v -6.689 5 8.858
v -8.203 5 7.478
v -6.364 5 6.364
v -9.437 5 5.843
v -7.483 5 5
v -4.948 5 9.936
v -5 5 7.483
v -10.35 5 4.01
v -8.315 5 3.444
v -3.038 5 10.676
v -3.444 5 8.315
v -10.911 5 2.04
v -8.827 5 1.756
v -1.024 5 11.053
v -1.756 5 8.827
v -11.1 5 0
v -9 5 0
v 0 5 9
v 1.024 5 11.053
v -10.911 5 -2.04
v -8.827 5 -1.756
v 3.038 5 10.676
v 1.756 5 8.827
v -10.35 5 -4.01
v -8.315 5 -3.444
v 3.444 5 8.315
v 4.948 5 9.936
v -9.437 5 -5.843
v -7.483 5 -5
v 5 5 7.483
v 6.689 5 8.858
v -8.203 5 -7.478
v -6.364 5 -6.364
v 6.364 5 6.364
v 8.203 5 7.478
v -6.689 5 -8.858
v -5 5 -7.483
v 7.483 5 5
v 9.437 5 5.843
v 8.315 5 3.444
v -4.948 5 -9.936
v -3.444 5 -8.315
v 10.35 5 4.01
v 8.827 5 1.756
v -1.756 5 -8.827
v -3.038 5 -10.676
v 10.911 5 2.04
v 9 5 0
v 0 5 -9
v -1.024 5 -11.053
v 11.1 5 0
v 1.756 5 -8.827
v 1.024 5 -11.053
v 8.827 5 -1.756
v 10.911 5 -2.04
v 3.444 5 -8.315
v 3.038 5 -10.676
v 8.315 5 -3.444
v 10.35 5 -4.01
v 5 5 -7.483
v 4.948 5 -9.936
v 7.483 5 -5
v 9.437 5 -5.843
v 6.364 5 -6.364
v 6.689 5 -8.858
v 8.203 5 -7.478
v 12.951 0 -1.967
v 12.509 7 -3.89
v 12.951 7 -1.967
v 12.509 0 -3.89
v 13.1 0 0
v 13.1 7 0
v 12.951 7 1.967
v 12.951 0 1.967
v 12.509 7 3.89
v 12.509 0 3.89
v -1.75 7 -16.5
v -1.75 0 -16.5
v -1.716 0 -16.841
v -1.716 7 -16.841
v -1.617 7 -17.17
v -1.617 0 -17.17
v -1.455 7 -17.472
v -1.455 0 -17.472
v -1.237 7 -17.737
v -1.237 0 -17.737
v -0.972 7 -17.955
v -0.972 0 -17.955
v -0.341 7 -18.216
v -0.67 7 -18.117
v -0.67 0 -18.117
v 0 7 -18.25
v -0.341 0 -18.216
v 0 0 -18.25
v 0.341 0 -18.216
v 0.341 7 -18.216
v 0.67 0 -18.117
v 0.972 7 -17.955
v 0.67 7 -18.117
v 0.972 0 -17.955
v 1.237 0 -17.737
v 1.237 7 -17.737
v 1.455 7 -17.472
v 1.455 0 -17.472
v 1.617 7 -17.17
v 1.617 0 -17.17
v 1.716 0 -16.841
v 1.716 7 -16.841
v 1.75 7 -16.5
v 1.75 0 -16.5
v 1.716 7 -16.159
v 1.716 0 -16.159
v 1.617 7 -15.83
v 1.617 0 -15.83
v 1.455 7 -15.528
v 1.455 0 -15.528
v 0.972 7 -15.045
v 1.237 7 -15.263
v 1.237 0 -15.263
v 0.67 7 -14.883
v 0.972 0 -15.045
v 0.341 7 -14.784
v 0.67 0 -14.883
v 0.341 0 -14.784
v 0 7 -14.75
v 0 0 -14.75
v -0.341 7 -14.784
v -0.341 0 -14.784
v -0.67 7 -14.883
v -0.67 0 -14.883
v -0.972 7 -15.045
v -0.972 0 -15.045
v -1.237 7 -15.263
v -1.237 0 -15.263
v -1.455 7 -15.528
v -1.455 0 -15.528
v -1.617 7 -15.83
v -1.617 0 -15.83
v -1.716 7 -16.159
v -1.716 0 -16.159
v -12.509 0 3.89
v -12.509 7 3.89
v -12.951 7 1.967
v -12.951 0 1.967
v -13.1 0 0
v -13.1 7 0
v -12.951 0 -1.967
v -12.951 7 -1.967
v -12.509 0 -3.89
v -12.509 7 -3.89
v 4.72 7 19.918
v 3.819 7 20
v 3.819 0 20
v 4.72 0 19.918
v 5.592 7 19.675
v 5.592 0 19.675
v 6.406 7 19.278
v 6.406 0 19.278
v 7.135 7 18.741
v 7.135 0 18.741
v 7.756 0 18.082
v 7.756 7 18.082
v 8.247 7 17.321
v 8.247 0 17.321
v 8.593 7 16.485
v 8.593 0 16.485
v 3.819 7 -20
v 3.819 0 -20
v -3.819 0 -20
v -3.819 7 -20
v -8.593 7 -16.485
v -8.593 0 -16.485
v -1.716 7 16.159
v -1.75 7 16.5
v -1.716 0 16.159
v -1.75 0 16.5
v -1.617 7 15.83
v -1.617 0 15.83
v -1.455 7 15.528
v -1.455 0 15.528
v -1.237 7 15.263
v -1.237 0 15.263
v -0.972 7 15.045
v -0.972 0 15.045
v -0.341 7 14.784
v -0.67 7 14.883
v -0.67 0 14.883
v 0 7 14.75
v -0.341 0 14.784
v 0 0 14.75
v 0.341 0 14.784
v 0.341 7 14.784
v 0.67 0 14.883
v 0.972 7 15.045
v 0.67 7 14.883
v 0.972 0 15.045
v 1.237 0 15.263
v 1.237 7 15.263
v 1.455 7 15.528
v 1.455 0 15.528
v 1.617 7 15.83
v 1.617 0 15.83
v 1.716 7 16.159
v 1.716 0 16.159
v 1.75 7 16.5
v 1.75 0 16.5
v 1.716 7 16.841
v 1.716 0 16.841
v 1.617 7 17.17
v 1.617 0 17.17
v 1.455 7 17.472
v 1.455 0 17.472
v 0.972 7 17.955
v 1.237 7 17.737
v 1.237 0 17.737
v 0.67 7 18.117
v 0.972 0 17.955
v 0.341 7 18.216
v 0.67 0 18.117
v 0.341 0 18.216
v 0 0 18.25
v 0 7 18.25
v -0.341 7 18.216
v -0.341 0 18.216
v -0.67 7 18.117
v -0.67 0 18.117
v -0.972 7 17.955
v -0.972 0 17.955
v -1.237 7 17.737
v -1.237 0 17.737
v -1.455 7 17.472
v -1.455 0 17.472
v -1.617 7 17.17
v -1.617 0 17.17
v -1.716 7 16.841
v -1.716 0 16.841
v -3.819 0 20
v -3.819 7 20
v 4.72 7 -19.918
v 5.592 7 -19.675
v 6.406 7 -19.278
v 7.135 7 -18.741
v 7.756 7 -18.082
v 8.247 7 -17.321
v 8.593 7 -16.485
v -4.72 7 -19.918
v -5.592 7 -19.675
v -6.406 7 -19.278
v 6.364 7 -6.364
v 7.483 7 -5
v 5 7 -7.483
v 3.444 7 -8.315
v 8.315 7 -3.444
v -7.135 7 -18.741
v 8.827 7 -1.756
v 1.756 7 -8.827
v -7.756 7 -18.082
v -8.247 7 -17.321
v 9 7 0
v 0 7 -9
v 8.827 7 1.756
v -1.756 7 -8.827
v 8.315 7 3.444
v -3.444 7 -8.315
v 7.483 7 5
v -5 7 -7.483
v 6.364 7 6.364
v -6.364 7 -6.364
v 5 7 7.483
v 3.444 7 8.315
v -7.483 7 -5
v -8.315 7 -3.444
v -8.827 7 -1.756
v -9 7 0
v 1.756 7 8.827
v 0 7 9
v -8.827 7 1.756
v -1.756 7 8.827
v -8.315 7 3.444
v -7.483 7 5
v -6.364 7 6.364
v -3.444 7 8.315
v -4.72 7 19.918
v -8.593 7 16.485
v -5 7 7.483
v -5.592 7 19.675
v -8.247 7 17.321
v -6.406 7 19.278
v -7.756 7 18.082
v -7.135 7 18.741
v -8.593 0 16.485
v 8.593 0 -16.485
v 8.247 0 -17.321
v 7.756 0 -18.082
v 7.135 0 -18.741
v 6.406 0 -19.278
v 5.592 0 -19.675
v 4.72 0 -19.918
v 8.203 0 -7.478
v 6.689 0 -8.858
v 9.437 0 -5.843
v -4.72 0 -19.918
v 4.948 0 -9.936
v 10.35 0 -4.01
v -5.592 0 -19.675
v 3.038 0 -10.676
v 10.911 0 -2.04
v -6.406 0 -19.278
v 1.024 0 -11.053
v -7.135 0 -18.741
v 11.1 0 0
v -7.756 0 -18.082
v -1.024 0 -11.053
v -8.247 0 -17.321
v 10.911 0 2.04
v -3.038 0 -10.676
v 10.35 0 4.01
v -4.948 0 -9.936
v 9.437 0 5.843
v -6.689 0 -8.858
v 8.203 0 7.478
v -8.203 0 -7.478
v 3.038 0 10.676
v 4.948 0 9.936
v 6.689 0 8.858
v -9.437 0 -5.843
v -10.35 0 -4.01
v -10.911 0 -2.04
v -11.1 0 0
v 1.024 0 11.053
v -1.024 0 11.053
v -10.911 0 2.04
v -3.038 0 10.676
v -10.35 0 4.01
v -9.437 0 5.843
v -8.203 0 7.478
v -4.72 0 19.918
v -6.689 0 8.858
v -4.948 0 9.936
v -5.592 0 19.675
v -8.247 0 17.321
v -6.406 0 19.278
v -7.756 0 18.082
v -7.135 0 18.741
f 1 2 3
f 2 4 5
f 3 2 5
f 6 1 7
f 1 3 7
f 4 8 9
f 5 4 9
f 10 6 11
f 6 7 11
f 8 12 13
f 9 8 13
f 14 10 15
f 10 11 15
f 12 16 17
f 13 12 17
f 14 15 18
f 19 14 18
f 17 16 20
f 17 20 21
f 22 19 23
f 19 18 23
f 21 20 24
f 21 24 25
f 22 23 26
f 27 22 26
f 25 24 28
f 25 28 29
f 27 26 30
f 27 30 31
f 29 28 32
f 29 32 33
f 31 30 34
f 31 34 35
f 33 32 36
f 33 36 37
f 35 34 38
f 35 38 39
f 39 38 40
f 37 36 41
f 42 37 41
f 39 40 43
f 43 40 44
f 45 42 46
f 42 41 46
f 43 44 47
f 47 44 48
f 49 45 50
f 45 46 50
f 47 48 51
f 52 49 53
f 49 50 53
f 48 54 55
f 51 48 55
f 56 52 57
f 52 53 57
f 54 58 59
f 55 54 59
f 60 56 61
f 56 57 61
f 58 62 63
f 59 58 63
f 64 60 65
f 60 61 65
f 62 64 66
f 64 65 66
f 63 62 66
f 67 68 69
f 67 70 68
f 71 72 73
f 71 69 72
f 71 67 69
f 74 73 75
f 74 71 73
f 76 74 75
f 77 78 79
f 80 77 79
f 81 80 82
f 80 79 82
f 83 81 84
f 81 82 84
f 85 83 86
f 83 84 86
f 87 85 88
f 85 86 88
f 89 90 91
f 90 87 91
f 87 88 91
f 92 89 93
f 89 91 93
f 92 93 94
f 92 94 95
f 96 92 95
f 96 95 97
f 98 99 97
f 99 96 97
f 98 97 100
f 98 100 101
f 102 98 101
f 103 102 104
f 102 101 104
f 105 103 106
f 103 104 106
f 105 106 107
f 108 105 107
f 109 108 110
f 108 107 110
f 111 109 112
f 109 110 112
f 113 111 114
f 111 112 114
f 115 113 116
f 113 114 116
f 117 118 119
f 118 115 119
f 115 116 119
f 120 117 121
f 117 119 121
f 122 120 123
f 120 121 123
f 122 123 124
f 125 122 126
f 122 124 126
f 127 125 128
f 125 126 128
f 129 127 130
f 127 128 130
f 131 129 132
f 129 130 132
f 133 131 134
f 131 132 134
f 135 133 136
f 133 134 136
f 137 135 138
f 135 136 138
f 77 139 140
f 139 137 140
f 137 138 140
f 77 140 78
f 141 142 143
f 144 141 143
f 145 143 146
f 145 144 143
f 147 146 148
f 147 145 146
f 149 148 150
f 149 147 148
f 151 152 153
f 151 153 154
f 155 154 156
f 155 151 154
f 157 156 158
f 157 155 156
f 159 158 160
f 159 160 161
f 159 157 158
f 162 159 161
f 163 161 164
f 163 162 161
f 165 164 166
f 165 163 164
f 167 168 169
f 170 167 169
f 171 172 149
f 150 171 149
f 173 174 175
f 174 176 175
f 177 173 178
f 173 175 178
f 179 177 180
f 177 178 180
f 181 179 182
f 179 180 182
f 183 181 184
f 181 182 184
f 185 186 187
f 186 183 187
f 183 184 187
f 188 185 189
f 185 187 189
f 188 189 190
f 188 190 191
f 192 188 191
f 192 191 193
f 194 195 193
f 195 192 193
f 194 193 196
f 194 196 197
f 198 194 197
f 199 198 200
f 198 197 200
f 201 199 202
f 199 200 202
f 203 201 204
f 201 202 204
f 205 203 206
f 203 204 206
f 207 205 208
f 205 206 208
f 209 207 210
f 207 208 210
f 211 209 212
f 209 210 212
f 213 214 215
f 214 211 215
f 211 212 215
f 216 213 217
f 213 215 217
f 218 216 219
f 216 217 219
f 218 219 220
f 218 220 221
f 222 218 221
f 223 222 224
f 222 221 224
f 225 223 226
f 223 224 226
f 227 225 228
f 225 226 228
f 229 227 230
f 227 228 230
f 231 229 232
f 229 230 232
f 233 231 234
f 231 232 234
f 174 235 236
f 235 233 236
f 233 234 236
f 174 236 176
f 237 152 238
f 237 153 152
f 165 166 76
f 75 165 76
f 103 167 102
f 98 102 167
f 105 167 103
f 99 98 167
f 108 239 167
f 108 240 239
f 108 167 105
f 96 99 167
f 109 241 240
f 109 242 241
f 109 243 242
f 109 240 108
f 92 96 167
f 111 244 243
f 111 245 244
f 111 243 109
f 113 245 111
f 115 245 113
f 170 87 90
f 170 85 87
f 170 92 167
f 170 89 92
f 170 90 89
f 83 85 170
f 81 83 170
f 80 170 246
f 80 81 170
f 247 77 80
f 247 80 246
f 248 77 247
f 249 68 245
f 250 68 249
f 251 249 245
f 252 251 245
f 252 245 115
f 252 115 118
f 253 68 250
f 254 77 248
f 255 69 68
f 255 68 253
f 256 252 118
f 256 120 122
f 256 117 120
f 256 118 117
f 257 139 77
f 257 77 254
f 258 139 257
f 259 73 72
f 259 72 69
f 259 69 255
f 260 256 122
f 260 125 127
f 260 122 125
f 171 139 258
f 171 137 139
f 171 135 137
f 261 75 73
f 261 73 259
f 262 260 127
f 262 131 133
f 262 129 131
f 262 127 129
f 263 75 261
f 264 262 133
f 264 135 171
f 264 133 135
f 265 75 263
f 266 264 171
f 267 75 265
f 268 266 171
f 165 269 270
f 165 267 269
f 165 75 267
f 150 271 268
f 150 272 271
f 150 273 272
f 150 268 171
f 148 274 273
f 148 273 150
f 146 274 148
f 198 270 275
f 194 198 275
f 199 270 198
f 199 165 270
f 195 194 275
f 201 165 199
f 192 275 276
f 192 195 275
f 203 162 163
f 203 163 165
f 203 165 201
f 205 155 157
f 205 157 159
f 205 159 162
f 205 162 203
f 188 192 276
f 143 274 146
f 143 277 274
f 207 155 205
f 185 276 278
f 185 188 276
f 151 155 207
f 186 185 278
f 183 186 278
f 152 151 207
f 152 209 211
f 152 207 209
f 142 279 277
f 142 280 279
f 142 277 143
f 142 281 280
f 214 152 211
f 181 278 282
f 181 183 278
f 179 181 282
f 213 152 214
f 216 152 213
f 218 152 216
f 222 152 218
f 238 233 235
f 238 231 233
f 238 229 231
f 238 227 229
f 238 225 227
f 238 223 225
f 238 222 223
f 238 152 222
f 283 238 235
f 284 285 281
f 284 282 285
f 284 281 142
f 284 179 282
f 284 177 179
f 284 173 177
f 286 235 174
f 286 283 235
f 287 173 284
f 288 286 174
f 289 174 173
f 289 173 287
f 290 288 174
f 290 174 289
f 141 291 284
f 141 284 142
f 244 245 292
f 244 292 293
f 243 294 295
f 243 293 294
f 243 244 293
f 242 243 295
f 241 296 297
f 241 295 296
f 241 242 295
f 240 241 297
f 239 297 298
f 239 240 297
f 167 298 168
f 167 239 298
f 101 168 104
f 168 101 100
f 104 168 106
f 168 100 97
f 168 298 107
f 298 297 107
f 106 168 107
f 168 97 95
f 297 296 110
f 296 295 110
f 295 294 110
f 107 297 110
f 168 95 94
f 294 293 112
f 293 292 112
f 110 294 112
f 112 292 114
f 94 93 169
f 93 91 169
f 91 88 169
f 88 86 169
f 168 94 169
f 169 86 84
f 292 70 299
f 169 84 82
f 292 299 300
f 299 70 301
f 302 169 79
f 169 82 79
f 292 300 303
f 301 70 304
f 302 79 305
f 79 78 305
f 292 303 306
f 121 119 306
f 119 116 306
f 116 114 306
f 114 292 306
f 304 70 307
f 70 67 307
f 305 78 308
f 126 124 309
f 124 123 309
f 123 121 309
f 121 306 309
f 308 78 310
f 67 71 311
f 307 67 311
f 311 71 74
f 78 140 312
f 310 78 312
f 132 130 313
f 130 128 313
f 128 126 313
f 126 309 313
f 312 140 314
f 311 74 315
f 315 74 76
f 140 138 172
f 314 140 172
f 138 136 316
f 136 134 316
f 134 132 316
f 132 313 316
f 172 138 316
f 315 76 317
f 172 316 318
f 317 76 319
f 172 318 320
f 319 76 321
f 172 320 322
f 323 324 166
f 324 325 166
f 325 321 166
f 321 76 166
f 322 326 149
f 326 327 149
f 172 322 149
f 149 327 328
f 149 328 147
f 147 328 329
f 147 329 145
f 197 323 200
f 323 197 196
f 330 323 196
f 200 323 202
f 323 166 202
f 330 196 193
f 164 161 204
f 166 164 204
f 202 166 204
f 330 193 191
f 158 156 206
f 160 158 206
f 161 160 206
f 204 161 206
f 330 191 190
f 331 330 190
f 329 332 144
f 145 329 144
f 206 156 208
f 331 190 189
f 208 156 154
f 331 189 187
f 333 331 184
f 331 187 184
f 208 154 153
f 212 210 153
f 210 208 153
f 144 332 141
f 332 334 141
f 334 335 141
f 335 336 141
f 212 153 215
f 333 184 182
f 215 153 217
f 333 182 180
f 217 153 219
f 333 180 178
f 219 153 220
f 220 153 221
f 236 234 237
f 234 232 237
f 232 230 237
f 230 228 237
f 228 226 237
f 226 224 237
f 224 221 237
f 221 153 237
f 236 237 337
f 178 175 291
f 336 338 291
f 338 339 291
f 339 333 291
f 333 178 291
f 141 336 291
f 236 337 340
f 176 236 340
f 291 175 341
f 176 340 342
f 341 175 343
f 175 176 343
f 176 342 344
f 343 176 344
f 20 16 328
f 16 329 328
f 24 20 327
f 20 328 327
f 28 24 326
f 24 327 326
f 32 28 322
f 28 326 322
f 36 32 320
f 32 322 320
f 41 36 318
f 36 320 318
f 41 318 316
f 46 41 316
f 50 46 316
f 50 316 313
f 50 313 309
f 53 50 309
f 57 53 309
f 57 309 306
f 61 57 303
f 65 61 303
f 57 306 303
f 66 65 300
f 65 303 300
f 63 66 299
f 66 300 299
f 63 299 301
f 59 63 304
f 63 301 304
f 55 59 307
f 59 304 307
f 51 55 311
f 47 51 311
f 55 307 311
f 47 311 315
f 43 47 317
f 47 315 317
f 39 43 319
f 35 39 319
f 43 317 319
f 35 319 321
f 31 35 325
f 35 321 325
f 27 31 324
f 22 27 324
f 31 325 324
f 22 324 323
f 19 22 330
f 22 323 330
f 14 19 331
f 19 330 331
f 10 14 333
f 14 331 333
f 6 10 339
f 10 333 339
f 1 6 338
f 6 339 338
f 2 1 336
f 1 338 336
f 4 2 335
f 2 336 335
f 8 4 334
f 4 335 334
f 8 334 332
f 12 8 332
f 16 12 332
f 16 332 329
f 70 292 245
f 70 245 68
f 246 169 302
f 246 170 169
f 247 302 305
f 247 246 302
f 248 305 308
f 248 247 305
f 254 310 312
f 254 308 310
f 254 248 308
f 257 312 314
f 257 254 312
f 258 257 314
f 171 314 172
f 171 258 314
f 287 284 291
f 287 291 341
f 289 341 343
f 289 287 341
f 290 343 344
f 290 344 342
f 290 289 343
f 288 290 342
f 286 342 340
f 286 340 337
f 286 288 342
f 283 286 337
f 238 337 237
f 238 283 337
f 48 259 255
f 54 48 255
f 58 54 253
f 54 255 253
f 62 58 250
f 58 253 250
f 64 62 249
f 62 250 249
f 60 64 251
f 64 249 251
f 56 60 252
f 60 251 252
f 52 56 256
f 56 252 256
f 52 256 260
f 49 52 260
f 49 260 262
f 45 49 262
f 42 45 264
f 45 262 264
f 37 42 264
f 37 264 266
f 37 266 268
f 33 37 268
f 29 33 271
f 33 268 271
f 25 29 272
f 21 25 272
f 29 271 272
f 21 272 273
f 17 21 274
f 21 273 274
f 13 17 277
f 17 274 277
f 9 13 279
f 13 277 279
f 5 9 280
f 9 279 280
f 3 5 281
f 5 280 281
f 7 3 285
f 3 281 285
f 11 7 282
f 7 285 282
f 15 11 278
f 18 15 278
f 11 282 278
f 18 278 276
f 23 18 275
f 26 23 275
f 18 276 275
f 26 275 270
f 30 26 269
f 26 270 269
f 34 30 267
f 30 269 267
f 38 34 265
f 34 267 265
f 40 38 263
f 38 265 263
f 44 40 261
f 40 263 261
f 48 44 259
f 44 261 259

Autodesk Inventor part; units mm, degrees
ref_plane "YZ Plane" through (0, 0, 0) normal (1, 0, 0) x (0, 1, 0)
ref_plane "XZ Plane" through (0, 0, 0) normal (0, 1, 0) x (-1, 0, 0)
ref_plane "XY Plane" through (0, 0, 0) normal (0, 0, 1) x (1, 0, 0)
sketch "Szkic1" plane through (0, 0, 0) normal (0, 1, 0) x (-1, 0, 0)
  circle A0 centre (0, 0) radius 11.1
  circle A1 centre (0, 0) radius 13.1
  line L0 (-7.5, 20) -> (7.5, 20)
  line L1 (0, 20) -> (0, 0) construction
  line L2 (7.5, 20) -> (12.5093, 3.8895)
  line L3 (-7.5, 20) -> (-12.5093, 3.8895)
  circle A2 centre (0, 16.5) radius 1.75
  line L4 (0, 0) -> (13.1, 0) construction
  line L5 (-7.5, -20) -> (7.5, -20)
  line L6 (0, -20) -> (0, 0) construction
  line L7 (7.5, -20) -> (12.5093, -3.8895)
  line L8 (-7.5, -20) -> (-12.5093, -3.8895)
  circle A3 centre (0, -16.5) radius 1.75
  arc A4 (12.5093, 3.8895) -> (-12.5093, 3.8895) centre (0, 0) ccw
  arc A5 (-12.5093, -3.8895) -> (12.5093, -3.8895) centre (0, 0) ccw
  dimension "d0" = 22.2
  dimension "d1" = 2
  dimension "d2" = 15
  dimension "d3" = 20
  dimension "d7" = 16.5
  dimension "d8" = 3.5
extrude "Wyciągnięcie proste1" add sketch "Szkic1" along normal blind 7
sketch "Szkic2" plane through (0, 7, 0) normal (0, 1, 0) x (1, 0, 0)
  circle A0 centre (0, 0) radius 13.1
  arc A1 (-12.5093, 3.8895) -> (-12.5093, -3.8895) centre (0, 0) ccw construction
  circle A2 centre (0, 0) radius 9
  circle A3 centre (0, 0) radius 11.1 construction
  dimension "d22" = 18
extrude "Wyciągnięcie proste2" add sketch "Szkic2" against normal blind 2
fillet "Zaokrąglenie1" radius 5 4 edges at (-7.5, 3.5, 20) (7.5, 3.5, 20) (7.5, 3.5, -20) (-7.5, 3.5, -20)
properties part number "CH_01_0022_bearing_mount"
